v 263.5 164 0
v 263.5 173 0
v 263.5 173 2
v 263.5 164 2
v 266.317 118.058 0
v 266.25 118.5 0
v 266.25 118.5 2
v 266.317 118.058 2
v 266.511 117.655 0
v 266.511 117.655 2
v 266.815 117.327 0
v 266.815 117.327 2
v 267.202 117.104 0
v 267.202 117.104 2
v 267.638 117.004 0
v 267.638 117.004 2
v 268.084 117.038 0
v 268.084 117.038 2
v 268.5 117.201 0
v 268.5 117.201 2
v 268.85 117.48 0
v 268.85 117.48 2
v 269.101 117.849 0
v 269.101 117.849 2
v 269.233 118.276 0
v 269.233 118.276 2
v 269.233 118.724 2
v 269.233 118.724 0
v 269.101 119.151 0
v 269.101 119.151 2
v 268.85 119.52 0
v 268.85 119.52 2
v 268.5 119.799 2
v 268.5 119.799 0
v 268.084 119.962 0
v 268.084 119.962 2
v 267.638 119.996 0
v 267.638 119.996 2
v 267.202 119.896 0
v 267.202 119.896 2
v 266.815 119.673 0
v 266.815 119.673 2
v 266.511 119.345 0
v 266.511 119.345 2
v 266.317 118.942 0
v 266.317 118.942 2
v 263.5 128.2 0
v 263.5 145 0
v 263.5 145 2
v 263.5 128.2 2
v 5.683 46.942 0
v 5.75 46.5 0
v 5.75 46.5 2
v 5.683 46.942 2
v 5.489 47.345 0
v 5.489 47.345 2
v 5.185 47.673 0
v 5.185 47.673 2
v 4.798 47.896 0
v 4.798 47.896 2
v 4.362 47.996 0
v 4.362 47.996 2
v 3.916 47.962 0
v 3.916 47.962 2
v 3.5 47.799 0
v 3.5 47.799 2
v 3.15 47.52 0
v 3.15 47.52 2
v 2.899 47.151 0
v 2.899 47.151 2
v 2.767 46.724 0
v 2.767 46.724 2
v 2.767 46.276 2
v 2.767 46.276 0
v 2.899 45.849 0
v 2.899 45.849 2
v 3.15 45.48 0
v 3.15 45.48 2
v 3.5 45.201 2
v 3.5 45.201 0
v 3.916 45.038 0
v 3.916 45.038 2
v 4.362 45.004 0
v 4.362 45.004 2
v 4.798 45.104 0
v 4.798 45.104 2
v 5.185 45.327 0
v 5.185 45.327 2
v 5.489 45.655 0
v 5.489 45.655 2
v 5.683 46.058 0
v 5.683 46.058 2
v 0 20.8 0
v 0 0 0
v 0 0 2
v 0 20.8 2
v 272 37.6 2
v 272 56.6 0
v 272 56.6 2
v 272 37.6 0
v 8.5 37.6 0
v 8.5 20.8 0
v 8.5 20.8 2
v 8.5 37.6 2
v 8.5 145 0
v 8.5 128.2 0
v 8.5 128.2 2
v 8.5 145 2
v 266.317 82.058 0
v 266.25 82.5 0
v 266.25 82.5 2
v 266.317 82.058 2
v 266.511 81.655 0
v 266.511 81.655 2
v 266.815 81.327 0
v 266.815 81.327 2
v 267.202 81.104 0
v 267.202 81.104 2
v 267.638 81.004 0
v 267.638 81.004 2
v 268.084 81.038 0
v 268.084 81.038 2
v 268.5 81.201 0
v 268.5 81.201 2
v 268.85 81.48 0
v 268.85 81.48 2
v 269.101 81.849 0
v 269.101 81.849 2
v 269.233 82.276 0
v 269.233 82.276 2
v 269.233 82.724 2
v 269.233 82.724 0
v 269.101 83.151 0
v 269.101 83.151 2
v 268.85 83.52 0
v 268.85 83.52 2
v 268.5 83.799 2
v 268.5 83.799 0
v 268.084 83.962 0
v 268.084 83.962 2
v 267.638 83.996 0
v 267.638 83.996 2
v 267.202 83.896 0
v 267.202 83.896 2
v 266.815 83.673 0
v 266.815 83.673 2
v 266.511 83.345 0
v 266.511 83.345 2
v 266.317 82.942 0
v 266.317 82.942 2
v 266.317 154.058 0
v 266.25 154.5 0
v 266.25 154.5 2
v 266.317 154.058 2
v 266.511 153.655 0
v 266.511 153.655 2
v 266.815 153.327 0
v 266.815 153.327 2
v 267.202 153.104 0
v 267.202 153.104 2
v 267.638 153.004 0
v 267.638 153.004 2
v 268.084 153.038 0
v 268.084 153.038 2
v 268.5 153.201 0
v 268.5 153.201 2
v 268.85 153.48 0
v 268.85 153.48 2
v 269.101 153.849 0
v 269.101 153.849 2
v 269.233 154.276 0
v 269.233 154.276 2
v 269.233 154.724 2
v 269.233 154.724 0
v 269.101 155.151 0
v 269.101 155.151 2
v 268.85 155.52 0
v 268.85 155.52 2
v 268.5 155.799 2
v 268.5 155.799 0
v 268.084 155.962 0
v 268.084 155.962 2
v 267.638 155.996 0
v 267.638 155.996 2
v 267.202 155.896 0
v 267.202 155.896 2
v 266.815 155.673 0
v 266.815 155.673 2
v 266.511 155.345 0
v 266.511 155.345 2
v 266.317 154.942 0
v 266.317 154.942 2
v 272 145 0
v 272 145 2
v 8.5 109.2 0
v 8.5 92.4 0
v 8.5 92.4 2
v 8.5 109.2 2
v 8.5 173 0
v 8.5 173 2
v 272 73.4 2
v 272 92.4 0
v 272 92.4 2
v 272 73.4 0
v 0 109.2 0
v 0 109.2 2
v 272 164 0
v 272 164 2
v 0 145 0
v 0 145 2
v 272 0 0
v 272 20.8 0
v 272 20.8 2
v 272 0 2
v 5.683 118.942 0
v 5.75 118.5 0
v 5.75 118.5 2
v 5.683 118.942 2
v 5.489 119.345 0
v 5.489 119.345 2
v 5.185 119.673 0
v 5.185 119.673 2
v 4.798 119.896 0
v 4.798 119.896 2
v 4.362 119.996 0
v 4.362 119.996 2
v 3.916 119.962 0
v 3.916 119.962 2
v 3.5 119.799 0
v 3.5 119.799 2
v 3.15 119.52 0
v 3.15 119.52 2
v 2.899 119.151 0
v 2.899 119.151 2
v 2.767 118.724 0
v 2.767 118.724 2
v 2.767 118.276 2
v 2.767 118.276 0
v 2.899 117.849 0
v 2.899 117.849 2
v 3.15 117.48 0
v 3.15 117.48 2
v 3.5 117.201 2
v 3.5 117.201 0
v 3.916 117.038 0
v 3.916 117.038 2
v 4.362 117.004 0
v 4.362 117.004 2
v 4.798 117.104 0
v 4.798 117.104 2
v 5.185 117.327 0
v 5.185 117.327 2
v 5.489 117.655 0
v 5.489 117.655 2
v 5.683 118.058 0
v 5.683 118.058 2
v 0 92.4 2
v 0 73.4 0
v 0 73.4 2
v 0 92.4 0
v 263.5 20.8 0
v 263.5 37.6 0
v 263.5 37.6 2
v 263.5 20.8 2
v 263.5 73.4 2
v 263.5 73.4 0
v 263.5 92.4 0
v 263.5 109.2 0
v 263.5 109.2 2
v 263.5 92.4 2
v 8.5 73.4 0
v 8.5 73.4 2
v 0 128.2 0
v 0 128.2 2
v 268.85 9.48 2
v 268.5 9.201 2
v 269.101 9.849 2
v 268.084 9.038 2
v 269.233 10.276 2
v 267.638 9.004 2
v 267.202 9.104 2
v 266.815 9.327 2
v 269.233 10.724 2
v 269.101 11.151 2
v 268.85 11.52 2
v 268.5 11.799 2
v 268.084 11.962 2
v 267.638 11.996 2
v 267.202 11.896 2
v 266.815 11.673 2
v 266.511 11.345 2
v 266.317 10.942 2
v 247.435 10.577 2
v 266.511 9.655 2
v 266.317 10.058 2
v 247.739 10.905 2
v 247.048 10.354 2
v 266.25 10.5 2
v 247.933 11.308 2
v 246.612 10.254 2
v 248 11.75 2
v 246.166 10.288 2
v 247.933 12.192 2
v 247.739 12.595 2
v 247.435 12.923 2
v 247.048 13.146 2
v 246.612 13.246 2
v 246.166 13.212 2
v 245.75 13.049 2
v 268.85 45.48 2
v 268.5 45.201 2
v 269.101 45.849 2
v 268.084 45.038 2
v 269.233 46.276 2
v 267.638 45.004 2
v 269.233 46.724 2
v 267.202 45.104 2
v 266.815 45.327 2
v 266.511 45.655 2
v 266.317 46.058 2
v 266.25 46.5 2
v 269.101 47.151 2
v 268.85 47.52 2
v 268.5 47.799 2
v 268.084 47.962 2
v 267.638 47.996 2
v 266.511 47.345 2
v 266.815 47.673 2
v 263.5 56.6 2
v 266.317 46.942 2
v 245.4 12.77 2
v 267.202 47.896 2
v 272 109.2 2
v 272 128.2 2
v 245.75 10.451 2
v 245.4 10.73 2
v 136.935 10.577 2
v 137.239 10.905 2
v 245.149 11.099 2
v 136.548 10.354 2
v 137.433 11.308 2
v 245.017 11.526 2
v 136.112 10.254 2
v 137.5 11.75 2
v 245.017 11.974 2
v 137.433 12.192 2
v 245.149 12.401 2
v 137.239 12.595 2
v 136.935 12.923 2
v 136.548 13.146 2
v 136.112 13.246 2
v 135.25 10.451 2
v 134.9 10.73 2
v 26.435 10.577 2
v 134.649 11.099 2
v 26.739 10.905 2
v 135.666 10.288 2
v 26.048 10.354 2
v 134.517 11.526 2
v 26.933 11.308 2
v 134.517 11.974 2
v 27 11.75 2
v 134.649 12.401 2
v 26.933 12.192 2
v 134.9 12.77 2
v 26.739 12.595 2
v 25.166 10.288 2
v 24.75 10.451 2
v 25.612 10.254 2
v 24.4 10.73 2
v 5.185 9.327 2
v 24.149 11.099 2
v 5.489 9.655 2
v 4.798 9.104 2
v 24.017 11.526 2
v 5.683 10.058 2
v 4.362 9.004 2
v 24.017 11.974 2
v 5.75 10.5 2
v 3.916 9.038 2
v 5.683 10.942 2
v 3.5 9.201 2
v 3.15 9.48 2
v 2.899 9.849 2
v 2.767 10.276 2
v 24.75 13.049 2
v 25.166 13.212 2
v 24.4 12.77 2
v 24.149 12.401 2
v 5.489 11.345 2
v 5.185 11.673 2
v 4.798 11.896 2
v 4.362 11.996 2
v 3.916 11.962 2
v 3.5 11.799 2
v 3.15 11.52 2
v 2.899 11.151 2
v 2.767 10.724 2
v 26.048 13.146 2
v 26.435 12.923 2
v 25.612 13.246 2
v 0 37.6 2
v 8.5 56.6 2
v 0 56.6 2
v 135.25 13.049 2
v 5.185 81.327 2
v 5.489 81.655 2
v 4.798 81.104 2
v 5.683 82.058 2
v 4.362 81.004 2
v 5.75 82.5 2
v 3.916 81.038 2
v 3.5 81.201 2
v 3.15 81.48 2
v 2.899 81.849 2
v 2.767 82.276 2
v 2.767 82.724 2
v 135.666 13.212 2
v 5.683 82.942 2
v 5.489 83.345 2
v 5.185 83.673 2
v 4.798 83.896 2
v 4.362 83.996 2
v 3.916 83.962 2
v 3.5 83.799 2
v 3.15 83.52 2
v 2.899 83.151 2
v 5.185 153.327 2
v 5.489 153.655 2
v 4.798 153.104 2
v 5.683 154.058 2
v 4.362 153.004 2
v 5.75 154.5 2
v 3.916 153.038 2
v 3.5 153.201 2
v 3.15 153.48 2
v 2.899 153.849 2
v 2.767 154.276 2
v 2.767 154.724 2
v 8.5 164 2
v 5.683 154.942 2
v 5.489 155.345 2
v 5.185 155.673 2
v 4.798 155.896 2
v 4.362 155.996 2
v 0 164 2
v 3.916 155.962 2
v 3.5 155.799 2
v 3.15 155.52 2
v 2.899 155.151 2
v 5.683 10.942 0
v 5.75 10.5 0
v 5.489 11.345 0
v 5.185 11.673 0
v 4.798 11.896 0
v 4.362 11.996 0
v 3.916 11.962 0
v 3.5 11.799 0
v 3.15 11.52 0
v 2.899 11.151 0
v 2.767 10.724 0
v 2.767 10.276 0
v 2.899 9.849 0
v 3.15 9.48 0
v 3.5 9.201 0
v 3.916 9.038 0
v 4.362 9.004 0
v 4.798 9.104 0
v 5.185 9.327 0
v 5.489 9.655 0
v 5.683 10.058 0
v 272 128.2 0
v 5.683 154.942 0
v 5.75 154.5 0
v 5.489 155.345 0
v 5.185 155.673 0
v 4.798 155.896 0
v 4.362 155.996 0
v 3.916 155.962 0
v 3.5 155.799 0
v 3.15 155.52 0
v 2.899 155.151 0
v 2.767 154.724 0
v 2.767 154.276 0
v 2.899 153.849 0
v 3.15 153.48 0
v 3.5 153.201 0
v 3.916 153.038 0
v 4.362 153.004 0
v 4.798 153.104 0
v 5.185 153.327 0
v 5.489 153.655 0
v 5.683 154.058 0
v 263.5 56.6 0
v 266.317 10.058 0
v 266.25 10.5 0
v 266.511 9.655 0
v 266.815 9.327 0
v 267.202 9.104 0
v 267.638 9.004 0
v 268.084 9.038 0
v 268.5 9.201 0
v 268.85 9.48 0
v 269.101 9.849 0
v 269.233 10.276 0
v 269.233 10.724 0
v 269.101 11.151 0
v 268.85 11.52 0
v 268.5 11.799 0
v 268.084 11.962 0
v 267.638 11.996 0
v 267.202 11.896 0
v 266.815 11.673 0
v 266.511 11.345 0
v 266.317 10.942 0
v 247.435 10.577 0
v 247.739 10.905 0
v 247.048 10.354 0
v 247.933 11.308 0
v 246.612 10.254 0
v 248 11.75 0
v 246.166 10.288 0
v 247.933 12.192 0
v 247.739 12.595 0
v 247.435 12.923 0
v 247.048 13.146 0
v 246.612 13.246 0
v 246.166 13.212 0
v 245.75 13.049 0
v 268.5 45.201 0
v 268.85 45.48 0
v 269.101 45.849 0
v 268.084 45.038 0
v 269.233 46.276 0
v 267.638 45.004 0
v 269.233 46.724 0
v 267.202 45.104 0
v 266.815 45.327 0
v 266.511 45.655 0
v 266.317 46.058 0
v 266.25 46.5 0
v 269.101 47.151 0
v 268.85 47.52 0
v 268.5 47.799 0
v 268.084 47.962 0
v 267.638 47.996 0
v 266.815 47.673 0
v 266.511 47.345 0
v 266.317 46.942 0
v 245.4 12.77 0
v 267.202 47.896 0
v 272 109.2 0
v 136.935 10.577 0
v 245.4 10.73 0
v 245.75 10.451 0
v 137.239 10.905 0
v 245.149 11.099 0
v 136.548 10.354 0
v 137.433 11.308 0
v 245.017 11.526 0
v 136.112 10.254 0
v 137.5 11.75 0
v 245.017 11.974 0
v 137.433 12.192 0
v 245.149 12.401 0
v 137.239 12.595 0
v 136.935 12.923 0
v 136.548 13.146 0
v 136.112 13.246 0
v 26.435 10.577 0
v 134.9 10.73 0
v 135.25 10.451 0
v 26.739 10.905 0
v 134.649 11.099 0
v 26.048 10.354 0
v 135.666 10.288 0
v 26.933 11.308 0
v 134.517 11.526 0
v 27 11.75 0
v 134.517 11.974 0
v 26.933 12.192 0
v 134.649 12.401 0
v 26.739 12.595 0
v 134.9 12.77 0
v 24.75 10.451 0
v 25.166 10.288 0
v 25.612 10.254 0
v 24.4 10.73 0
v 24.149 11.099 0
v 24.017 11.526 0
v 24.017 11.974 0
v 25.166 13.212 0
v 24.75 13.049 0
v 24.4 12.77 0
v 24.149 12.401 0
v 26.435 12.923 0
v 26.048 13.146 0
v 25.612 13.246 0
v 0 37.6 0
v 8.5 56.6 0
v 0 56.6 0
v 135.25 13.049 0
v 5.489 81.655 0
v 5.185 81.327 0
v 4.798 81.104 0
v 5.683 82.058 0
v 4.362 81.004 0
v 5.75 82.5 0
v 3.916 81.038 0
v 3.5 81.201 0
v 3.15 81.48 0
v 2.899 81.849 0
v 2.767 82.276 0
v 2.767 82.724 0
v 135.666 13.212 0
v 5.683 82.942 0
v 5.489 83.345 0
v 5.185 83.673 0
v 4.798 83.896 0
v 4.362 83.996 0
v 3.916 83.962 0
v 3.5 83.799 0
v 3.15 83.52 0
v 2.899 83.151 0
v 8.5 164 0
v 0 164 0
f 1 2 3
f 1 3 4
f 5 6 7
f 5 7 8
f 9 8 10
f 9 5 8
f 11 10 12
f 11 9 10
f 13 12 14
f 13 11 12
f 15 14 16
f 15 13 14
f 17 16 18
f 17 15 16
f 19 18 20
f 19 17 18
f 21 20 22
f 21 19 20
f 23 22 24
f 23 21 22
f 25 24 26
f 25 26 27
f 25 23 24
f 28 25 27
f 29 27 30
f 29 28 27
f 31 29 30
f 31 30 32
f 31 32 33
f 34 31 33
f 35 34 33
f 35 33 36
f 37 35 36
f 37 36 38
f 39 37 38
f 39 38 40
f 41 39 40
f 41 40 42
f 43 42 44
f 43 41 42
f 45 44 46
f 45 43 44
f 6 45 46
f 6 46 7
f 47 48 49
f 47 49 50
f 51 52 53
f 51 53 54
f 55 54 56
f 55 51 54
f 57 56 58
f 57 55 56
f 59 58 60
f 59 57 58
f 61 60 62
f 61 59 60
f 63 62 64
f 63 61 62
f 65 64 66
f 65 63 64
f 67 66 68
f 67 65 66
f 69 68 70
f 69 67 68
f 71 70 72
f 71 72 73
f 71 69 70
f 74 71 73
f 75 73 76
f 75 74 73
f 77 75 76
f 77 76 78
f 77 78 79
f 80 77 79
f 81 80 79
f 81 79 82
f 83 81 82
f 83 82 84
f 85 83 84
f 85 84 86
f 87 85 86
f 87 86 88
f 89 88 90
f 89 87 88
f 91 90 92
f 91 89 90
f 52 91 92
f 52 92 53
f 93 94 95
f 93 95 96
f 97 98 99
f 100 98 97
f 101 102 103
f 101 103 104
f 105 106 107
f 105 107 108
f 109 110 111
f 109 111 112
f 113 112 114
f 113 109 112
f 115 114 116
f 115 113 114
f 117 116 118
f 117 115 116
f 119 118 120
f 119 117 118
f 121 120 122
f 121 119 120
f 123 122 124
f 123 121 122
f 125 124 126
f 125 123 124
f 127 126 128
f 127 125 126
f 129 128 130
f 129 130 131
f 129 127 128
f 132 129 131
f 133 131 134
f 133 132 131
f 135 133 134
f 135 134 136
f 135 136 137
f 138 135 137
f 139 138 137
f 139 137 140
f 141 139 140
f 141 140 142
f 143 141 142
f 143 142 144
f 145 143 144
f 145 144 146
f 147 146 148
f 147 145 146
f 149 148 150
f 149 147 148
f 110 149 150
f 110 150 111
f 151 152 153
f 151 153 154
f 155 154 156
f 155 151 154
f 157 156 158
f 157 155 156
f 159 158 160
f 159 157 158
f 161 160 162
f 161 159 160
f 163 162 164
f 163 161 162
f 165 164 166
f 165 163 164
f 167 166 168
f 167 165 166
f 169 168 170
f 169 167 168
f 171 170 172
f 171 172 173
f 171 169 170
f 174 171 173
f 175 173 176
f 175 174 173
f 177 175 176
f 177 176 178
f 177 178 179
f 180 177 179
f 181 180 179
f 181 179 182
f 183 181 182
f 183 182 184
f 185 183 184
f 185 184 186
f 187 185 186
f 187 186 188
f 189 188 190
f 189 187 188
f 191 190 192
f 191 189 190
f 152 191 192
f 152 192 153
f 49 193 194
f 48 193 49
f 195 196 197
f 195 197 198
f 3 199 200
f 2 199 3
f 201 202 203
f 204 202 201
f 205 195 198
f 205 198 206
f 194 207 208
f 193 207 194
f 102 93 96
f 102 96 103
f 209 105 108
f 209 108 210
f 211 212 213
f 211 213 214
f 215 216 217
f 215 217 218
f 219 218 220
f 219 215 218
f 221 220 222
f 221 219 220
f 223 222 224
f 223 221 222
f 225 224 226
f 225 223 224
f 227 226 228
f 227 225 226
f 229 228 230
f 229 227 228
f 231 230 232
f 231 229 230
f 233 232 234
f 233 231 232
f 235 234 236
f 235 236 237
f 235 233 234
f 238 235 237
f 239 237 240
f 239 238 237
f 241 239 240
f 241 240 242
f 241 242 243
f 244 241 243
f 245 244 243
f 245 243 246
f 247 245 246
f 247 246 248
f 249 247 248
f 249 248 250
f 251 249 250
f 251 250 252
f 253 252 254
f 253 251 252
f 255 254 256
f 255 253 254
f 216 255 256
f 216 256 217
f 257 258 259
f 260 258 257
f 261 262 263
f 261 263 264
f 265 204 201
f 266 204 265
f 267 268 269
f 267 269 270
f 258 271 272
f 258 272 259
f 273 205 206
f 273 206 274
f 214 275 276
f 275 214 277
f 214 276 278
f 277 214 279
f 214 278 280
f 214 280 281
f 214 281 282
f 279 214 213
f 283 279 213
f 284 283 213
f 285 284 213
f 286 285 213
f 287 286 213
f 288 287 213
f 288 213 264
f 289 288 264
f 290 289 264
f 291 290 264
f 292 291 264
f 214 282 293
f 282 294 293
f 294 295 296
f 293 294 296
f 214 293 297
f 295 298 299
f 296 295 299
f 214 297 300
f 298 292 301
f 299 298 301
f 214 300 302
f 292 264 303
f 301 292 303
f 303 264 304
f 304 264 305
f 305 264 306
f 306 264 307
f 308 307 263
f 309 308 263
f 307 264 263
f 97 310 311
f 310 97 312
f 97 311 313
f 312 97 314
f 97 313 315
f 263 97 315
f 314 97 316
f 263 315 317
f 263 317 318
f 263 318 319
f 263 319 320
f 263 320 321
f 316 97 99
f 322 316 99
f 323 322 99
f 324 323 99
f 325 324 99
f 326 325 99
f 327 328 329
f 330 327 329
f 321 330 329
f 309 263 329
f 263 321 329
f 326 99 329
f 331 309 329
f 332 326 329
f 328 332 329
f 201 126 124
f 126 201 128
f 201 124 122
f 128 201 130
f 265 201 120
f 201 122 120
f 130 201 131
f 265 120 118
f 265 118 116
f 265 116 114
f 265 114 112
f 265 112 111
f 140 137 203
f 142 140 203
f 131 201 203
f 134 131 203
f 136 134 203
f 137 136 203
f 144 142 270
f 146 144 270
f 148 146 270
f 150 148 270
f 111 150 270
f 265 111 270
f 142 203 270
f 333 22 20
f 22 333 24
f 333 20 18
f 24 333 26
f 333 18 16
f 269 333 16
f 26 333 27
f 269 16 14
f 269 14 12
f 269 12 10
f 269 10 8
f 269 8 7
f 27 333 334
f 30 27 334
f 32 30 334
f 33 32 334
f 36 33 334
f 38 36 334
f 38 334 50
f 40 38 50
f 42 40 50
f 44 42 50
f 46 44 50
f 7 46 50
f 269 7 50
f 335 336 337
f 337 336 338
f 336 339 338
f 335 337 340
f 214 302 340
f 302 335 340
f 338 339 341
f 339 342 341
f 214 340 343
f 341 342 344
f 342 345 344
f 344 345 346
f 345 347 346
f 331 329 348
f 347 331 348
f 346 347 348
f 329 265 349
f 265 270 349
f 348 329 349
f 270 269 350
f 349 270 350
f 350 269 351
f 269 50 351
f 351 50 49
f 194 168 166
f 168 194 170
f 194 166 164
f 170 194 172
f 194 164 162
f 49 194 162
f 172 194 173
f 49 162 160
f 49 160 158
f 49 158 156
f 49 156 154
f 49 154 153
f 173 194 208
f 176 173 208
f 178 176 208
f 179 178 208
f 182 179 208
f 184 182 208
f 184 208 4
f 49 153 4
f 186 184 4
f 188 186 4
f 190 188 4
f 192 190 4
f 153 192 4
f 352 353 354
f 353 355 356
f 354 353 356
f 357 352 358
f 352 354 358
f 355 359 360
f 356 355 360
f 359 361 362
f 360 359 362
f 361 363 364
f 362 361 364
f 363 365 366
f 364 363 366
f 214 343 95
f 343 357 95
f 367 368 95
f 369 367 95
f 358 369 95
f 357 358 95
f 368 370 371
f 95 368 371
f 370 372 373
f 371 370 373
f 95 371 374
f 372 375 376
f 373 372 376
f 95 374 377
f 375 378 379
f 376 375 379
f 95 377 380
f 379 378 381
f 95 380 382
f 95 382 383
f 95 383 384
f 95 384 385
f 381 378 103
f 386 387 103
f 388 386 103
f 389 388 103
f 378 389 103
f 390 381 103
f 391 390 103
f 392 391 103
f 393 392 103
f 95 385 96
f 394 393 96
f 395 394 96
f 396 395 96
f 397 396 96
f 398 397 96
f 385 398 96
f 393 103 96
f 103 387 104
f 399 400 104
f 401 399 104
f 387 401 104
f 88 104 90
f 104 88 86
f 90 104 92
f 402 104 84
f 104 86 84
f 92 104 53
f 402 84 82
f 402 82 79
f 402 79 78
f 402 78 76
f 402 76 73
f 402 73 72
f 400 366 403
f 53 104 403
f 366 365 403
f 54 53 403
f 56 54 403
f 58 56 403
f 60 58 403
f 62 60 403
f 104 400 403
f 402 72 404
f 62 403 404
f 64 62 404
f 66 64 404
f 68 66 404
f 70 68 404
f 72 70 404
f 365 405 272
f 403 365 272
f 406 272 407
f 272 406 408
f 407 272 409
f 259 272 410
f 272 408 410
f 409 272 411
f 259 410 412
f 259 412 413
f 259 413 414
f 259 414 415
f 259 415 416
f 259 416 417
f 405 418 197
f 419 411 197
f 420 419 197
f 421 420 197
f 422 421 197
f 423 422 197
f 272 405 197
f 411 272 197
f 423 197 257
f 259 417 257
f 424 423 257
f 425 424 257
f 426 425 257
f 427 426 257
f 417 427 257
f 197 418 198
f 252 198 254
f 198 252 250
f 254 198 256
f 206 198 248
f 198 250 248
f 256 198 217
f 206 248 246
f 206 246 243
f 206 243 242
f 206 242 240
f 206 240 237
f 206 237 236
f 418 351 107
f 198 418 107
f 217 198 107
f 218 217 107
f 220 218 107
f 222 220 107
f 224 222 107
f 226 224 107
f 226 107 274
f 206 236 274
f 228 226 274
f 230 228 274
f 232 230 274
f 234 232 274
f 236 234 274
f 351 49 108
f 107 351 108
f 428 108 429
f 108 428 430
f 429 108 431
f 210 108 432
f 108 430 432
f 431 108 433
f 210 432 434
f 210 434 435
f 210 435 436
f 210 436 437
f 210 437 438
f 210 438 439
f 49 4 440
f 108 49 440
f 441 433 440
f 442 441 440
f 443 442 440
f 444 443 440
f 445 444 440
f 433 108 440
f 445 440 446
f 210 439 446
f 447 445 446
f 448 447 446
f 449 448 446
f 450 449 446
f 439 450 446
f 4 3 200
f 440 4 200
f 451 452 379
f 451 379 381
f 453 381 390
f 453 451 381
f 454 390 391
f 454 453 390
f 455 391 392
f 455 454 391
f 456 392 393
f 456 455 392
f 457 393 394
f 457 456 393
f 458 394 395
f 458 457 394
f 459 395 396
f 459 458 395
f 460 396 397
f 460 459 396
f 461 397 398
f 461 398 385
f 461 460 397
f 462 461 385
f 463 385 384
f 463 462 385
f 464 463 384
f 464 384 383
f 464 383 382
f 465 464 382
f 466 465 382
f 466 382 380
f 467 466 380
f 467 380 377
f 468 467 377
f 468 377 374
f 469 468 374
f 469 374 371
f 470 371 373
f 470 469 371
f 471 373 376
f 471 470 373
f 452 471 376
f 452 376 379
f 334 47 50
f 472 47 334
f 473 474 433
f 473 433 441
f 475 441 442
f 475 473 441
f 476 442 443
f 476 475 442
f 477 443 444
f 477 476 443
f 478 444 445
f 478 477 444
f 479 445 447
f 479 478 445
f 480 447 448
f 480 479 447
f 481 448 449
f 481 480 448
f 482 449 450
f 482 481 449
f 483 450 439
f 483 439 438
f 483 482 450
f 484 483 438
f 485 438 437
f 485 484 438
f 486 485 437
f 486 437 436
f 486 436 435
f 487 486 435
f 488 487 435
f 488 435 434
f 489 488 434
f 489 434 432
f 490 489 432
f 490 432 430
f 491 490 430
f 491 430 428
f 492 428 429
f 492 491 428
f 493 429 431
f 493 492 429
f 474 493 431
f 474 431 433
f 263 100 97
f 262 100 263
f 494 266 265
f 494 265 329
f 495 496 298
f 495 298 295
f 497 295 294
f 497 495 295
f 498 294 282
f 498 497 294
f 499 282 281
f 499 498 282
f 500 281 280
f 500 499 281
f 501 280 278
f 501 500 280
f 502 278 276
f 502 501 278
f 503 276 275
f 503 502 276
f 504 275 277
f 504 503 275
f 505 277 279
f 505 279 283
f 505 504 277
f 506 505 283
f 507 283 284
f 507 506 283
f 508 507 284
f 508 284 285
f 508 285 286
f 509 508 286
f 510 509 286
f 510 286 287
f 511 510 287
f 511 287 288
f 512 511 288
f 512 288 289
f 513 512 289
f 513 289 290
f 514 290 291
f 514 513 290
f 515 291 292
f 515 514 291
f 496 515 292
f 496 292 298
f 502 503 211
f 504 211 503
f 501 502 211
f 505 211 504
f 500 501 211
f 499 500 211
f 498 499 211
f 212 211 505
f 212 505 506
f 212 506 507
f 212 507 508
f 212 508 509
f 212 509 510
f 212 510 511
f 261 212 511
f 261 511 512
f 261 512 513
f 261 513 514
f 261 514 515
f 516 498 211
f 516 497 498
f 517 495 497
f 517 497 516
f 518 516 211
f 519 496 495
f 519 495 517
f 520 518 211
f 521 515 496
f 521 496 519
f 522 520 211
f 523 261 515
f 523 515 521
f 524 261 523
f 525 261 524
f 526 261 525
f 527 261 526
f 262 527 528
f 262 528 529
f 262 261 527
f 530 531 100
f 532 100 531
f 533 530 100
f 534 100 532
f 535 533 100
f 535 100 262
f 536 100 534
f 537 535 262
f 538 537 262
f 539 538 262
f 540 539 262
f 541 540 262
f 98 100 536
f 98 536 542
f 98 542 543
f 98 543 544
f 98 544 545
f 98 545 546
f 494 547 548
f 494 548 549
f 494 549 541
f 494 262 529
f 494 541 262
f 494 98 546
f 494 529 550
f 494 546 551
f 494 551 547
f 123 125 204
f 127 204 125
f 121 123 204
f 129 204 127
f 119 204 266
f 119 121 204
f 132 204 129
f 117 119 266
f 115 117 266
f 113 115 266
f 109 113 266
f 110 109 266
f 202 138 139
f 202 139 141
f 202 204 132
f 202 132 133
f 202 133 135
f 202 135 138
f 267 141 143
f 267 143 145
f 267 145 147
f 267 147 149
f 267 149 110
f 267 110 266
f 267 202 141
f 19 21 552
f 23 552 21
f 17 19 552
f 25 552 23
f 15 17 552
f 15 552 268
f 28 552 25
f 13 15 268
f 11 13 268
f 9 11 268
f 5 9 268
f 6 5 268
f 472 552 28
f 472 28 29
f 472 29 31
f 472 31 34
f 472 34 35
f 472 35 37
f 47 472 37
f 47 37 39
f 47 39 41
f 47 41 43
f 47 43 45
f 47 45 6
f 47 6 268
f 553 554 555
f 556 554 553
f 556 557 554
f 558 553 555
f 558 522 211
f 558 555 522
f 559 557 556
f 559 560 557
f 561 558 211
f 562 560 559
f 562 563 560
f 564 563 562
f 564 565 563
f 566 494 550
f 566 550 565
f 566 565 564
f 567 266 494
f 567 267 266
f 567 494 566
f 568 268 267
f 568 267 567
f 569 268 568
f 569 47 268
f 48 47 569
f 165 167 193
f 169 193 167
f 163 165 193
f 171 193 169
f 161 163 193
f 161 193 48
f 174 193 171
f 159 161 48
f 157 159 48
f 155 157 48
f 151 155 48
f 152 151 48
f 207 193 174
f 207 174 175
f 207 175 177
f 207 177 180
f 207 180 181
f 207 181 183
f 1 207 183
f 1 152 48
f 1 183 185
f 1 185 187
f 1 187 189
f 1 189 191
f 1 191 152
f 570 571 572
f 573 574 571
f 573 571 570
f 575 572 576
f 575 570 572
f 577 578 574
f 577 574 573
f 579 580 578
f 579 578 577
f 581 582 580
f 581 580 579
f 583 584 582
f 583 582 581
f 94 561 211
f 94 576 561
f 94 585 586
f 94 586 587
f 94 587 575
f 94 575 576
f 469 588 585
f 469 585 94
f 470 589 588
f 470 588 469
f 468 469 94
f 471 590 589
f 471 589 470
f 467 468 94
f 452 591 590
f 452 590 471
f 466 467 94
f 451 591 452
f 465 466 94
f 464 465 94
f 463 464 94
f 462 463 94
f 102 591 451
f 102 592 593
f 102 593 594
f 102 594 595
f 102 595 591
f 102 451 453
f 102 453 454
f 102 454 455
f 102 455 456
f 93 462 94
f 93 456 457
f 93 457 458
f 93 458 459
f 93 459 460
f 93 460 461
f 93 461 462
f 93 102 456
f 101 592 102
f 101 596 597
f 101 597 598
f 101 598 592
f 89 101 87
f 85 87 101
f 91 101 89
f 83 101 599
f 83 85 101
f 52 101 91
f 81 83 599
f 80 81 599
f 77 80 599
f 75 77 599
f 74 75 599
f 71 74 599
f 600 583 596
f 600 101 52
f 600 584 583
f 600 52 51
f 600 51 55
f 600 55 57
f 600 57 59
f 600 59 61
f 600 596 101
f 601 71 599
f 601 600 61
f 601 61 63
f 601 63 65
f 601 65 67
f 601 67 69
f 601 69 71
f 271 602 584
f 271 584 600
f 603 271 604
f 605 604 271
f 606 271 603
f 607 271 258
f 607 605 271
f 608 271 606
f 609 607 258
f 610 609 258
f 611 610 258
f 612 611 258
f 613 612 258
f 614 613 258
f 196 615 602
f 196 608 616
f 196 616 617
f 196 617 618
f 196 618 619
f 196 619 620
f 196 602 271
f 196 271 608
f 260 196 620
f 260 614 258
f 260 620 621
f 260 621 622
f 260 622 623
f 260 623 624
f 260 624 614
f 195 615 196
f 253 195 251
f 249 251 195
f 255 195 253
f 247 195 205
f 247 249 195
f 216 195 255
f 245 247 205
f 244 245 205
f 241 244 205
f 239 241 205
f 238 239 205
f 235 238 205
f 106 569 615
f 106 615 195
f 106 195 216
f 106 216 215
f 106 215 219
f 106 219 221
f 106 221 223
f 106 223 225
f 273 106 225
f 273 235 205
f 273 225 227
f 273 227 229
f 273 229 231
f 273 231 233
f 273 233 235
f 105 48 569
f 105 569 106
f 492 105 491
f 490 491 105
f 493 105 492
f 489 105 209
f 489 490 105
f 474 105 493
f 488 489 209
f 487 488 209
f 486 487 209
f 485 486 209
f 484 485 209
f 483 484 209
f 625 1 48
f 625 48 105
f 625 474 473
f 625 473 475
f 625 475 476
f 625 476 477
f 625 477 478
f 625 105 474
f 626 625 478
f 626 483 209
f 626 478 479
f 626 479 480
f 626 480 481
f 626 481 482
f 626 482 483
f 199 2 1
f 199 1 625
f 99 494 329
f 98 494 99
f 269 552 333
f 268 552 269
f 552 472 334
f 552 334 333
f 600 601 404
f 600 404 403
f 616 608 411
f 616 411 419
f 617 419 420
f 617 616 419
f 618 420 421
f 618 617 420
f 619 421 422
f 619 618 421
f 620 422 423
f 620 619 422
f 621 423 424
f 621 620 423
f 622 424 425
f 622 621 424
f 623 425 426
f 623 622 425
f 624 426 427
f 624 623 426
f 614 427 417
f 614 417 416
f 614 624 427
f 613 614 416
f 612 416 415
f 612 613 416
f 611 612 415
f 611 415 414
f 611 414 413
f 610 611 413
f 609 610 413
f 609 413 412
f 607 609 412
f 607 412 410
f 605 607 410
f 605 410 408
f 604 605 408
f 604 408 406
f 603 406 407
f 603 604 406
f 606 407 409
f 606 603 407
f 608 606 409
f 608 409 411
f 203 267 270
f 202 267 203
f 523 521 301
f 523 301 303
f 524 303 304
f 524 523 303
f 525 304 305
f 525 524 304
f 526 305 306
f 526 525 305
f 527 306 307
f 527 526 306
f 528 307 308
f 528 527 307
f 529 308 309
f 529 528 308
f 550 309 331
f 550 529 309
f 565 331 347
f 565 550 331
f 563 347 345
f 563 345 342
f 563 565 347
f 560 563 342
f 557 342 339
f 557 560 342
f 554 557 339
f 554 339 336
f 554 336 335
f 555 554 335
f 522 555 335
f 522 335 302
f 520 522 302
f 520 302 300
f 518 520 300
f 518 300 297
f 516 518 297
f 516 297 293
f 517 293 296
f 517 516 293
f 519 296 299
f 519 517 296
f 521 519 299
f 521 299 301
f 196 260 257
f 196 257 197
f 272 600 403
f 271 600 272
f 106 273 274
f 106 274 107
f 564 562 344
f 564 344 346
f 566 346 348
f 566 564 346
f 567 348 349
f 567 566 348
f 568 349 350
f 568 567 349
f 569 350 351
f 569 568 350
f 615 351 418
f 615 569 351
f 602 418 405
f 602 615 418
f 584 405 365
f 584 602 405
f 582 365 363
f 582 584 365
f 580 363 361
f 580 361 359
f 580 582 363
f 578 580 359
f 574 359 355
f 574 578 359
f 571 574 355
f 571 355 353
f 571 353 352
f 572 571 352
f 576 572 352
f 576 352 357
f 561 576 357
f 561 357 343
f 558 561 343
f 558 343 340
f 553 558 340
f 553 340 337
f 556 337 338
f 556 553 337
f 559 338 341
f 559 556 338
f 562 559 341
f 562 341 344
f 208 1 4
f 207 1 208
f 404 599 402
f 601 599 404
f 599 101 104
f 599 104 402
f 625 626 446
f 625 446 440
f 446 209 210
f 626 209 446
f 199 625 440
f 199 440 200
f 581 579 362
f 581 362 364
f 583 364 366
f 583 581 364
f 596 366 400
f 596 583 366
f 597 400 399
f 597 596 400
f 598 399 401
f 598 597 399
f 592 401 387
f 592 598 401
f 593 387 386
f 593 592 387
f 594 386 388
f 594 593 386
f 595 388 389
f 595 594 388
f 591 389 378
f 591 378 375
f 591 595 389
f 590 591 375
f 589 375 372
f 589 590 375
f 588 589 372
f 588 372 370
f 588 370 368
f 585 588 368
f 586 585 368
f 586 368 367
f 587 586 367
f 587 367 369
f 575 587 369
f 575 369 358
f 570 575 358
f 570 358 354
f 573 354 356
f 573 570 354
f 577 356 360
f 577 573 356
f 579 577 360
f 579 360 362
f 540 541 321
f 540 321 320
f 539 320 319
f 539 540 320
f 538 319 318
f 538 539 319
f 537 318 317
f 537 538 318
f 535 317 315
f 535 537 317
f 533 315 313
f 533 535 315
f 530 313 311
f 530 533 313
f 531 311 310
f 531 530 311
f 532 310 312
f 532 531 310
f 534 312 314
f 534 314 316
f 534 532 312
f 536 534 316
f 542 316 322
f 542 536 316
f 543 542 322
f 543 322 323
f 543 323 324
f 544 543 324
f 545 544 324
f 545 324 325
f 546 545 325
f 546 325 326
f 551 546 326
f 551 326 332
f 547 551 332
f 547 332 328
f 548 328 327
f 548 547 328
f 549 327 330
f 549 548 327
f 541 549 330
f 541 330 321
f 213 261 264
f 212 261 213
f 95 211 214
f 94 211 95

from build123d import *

# Parameters (mm, degrees)
SKETCH1_R           = 1.5
BOSS_EXTRUDE1_DEPTH = 2


with BuildPart() as part:
    # Sketch1 → Boss-Extrude1 (new body)
    with BuildSketch(Plane.XY):
        Polygon((0, 20.8), (8.5, 20.8), (8.5, 37.6), (0, 37.6), (0, 56.6), (8.5, 56.6), (8.5, 73.4), (0, 73.4), (0, 92.4), (8.5, 92.4), (8.5, 109.2), (0, 109.2), (0, 128.2), (8.5, 128.2), (8.5, 145), (0, 145), (0, 164), (8.5, 164), (8.5, 173), (263.5, 173), (263.5, 164), (272, 164), (272, 145), (263.5, 145), (263.5, 128.2), (272, 128.2), (272, 109.2), (263.5, 109.2), (263.5, 92.4), (272, 92.4), (272, 73.4), (263.5, 73.4), (263.5, 56.6), (272, 56.6), (272, 37.6), (263.5, 37.6), (263.5, 20.8), (272, 20.8), (272, 0), (0, 0), align=None)
        with Locations((4.25, 154.5)):
            Circle(SKETCH1_R, mode=Mode.SUBTRACT)
        with Locations((4.25, 118.5)):
            Circle(SKETCH1_R, mode=Mode.SUBTRACT)
        with Locations((4.25, 82.5)):
            Circle(SKETCH1_R, mode=Mode.SUBTRACT)
        with Locations((4.25, 46.5)):
            Circle(SKETCH1_R, mode=Mode.SUBTRACT)
        with Locations((4.25, 10.5)):
            Circle(SKETCH1_R, mode=Mode.SUBTRACT)
        with Locations(Location((267.75, 10.5, 0), (0, 0, 180))):
            Circle(SKETCH1_R, mode=Mode.SUBTRACT)
        with Locations(Location((267.75, 46.5, 0), (0, 0, 180))):
            Circle(SKETCH1_R, mode=Mode.SUBTRACT)
        with Locations(Location((267.75, 82.5, 0), (0, 0, 180))):
            Circle(SKETCH1_R, mode=Mode.SUBTRACT)
        with Locations(Location((267.75, 118.5, 0), (0, 0, 180))):
            Circle(SKETCH1_R, mode=Mode.SUBTRACT)
        with Locations(Location((267.75, 154.5, 0), (0, 0, 180))):
            Circle(SKETCH1_R, mode=Mode.SUBTRACT)
        with Locations((25.5, 11.75)):
            Circle(SKETCH1_R, mode=Mode.SUBTRACT)
        with Locations((136, 11.75)):
            Circle(SKETCH1_R, mode=Mode.SUBTRACT)
        with Locations((246.5, 11.75)):
            Circle(SKETCH1_R, mode=Mode.SUBTRACT)
    extrude(amount=BOSS_EXTRUDE1_DEPTH)


solid = part.part
